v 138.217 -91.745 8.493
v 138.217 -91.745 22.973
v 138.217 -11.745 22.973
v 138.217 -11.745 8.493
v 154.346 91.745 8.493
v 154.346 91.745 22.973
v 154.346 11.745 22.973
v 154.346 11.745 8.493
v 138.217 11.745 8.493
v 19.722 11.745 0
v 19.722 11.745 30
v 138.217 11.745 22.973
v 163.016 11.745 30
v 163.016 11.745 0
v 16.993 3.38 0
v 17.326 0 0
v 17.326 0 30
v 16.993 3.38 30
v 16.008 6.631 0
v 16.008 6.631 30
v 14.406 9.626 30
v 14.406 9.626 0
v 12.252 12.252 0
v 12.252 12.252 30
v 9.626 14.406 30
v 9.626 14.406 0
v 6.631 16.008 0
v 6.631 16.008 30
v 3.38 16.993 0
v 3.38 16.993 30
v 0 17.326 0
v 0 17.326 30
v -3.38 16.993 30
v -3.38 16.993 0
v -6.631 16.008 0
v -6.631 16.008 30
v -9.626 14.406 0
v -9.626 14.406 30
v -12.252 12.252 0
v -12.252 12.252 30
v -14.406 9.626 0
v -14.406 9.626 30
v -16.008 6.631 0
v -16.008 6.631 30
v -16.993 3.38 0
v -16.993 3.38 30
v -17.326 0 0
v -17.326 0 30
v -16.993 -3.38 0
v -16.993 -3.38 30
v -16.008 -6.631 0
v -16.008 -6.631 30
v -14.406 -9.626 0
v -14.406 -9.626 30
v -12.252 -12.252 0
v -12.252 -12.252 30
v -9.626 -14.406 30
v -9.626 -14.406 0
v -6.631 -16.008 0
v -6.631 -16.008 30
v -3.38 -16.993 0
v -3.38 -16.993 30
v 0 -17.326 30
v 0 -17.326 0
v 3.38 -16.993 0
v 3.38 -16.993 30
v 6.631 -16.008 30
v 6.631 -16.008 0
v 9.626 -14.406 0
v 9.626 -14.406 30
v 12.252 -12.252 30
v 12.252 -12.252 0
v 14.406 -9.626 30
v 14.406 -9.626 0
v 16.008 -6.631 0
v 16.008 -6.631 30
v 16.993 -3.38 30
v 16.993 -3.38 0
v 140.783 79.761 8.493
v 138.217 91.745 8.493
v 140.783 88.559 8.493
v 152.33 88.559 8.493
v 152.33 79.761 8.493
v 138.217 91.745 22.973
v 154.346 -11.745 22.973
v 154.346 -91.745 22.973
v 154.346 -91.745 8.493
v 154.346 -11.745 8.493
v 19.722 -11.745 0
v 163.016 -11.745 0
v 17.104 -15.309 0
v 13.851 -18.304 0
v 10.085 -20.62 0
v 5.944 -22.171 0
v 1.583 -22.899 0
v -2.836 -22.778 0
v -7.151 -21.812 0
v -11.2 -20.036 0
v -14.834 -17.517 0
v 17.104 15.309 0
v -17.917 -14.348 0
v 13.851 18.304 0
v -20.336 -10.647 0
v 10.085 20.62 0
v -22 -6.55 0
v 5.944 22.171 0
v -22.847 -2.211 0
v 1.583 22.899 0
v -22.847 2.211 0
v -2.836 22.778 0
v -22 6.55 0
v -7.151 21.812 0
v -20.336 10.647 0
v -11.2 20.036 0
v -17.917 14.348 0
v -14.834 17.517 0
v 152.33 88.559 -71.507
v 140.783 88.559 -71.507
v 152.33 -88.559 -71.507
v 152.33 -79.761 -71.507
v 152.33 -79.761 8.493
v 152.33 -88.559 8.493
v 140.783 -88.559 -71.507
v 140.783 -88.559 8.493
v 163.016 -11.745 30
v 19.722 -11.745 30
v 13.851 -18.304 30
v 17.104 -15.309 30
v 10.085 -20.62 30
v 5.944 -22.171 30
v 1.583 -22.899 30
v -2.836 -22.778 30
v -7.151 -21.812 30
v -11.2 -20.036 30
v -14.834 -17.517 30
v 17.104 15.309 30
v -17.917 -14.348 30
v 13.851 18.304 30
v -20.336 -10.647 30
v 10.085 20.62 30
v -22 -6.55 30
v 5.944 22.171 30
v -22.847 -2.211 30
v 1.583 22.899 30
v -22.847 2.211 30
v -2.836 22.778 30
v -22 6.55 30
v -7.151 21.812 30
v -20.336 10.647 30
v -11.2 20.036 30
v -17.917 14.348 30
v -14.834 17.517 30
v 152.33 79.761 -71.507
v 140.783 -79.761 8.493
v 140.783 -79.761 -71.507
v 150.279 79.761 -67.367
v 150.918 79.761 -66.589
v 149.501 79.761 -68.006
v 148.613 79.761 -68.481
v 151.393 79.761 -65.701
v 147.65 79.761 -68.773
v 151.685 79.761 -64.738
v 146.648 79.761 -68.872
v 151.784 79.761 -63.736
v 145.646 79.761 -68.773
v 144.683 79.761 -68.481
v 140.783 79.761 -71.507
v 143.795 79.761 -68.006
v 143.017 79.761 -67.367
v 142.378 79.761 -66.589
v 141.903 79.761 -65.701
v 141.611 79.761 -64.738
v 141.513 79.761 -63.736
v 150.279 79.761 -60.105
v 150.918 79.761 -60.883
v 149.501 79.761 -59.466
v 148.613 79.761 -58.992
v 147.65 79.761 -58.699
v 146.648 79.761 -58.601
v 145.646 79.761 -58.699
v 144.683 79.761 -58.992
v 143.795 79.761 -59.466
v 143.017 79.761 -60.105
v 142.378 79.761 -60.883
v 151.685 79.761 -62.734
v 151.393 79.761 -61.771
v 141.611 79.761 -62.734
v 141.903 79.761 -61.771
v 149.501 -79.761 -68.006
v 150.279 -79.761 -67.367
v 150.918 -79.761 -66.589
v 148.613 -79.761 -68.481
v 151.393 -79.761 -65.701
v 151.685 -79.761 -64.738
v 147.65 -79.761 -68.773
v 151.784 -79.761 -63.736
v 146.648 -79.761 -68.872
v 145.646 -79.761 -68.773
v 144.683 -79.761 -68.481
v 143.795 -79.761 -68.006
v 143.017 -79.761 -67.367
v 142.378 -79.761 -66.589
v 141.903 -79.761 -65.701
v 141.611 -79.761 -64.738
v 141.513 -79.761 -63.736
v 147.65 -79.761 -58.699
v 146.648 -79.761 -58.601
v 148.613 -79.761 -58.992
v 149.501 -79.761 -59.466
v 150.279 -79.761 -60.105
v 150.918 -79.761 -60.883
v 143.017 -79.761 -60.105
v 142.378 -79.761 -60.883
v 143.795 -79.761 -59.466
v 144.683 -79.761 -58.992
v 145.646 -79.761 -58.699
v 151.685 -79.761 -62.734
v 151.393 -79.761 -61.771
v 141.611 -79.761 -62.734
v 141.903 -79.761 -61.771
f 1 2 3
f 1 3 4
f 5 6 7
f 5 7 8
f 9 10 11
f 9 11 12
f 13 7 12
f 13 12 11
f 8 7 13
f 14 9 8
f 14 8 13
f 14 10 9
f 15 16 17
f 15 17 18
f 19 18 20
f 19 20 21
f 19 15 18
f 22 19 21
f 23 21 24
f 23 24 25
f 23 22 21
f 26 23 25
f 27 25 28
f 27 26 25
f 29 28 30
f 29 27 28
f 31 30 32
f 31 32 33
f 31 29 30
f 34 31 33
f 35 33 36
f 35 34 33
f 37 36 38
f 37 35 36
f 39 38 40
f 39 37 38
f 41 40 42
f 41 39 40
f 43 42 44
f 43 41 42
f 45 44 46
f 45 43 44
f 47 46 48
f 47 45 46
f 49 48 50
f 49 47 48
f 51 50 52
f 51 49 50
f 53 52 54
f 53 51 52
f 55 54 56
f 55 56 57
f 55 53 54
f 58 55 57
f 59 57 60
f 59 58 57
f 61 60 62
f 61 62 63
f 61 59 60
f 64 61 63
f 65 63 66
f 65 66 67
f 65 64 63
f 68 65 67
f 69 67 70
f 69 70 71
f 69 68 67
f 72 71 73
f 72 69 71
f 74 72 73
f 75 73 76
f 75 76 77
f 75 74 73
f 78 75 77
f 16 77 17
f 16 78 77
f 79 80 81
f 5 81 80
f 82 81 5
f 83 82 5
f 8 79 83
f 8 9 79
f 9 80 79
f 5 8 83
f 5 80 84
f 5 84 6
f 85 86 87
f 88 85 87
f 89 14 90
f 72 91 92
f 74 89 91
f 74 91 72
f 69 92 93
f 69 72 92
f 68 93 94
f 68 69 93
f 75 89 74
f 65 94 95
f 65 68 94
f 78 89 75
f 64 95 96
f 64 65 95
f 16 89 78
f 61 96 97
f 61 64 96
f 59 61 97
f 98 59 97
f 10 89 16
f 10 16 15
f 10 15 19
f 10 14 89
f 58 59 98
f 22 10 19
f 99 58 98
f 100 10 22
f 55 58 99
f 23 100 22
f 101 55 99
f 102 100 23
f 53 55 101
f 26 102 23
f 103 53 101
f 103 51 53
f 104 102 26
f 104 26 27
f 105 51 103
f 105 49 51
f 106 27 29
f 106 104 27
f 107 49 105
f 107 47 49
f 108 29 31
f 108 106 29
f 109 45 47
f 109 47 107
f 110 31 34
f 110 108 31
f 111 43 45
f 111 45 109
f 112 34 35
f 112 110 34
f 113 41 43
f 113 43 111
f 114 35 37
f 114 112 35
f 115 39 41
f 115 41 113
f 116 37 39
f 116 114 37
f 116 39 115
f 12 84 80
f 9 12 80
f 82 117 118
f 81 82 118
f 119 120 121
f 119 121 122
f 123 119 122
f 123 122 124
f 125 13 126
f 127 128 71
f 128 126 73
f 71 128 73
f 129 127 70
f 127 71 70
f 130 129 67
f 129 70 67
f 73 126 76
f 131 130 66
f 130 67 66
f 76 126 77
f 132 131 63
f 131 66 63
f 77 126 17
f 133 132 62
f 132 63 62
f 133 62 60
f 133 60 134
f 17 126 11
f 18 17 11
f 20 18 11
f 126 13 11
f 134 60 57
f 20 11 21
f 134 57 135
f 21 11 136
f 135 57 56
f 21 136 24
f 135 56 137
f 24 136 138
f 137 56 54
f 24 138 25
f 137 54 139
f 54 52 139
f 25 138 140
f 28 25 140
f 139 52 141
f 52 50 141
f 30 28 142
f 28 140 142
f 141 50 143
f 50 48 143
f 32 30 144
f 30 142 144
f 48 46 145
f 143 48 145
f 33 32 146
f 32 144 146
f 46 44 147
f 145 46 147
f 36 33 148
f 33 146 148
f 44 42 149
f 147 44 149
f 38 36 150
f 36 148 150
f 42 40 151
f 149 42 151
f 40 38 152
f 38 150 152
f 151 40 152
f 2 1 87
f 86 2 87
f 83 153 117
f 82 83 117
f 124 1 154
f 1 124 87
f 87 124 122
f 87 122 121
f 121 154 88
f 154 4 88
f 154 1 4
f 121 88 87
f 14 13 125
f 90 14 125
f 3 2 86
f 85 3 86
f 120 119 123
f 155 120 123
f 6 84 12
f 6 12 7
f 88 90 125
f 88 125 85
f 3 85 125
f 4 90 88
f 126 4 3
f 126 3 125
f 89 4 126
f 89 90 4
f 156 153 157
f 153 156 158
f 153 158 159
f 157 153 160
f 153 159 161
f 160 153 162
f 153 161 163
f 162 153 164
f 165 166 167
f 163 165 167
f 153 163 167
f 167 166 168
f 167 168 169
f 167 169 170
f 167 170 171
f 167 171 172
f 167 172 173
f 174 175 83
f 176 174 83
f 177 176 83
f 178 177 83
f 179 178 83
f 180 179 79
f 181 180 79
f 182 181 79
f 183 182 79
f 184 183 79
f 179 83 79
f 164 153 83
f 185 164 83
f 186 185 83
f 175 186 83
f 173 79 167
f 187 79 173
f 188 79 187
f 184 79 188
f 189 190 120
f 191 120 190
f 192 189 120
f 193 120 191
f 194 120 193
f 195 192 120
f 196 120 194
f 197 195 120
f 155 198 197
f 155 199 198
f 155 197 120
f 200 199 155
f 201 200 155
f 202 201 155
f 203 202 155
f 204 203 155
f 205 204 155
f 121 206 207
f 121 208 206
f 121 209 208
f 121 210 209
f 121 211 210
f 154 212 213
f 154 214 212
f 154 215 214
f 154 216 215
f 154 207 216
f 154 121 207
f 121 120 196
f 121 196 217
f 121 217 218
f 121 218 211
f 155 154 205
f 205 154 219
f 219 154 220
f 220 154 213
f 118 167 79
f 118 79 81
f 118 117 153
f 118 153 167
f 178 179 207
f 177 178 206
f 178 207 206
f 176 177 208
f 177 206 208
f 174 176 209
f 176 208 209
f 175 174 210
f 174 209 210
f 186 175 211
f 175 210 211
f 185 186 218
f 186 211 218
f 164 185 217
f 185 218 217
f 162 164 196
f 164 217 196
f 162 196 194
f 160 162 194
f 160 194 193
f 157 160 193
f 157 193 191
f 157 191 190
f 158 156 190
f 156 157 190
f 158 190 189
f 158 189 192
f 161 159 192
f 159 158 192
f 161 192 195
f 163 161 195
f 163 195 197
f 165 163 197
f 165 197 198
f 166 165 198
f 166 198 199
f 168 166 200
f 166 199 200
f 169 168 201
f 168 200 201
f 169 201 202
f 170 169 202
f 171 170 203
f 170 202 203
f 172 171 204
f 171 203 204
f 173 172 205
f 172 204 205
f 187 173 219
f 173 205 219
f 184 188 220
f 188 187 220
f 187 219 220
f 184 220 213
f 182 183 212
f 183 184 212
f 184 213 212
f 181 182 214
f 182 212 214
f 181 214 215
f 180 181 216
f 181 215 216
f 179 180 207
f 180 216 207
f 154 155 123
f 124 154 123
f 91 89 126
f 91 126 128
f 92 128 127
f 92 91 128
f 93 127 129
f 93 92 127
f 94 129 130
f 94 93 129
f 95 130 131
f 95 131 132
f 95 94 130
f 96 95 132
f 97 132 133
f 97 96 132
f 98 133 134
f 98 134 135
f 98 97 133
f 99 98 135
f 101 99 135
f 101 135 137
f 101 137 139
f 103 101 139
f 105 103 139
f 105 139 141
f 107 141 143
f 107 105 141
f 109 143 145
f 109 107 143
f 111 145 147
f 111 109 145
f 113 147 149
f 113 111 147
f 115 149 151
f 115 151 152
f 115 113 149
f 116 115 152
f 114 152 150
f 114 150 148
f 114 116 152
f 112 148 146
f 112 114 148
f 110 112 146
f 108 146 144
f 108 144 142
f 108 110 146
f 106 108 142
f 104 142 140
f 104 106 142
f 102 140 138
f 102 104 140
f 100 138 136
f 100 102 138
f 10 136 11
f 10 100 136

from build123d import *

# Parameters (mm, degrees)
SKETCH1_R           = 17.326400039
BOSS_EXTRUDE1_DEPTH = 30
SKETCH3_W           = 16.12994251
SKETCH3_H           = 14.480289299
BOSS_EXTRUDE2_DEPTH = 80
SKETCH4_W           = 11.547572479
SKETCH4_H           = 8.79815046
BOSS_EXTRUDE3_DEPTH = 80
SKETCH5_R           = 5.135526513
BOSS_EXTRUDE4_DEPTH = 162


with BuildPart() as part:
    # Sketch1 → Boss-Extrude1 (new body)
    with BuildSketch(Plane.XY):
        with BuildLine():
            Line((19.721500067, 11.745451968), (163.015891701, 11.745451968))
            Line((163.015891701, 11.745451968), (163.015891701, -11.745451968))
            Line((163.015891701, -11.745451968), (19.721500067, -11.745451968))
            ThreePointArc((19.721500067, -11.745451968), (-22.954154456, 0), (19.721500067, 11.745451968))
        make_face()
        Circle(SKETCH1_R, mode=Mode.SUBTRACT)
    extrude(amount=BOSS_EXTRUDE1_DEPTH)

    # Sketch3 → Boss-Extrude2 (add)
    with BuildSketch(Plane(origin=(0, 11.745451968, 0), x_dir=(1, 0, 0), z_dir=(0, 1, 0))):
        with Locations((146.281505943, -15.733179206)):
            Rectangle(SKETCH3_W, SKETCH3_H)
    boss_extrude2 = extrude(amount=BOSS_EXTRUDE2_DEPTH)

    # Sketch4 → Boss-Extrude3 (add)
    with BuildSketch(Plane(origin=(0, 0, 8.493034556), x_dir=(-1, 0, 0), z_dir=(0, 0, -1))):
        with Locations((-146.556448146, 84.160187296)):
            Rectangle(SKETCH4_W, SKETCH4_H)
    boss_extrude3 = extrude(amount=BOSS_EXTRUDE3_DEPTH)

    # Mirror1: Boss-Extrude2, Boss-Extrude3 across plane
    add(boss_extrude2.mirror(Plane.ZX))
    add(boss_extrude3.mirror(Plane.ZX))

    # Sketch5 → Boss-Extrude4 (add)
    with BuildSketch(Plane(origin=(0, -79.761112066, 0), x_dir=(1, 0, 0), z_dir=(0, 1, 0))):
        with Locations(Location((146.648095546, 63.736113616, 0), (0, 0, 270))):
            Circle(SKETCH5_R)
    extrude(amount=BOSS_EXTRUDE4_DEPTH)


solid = part.part
